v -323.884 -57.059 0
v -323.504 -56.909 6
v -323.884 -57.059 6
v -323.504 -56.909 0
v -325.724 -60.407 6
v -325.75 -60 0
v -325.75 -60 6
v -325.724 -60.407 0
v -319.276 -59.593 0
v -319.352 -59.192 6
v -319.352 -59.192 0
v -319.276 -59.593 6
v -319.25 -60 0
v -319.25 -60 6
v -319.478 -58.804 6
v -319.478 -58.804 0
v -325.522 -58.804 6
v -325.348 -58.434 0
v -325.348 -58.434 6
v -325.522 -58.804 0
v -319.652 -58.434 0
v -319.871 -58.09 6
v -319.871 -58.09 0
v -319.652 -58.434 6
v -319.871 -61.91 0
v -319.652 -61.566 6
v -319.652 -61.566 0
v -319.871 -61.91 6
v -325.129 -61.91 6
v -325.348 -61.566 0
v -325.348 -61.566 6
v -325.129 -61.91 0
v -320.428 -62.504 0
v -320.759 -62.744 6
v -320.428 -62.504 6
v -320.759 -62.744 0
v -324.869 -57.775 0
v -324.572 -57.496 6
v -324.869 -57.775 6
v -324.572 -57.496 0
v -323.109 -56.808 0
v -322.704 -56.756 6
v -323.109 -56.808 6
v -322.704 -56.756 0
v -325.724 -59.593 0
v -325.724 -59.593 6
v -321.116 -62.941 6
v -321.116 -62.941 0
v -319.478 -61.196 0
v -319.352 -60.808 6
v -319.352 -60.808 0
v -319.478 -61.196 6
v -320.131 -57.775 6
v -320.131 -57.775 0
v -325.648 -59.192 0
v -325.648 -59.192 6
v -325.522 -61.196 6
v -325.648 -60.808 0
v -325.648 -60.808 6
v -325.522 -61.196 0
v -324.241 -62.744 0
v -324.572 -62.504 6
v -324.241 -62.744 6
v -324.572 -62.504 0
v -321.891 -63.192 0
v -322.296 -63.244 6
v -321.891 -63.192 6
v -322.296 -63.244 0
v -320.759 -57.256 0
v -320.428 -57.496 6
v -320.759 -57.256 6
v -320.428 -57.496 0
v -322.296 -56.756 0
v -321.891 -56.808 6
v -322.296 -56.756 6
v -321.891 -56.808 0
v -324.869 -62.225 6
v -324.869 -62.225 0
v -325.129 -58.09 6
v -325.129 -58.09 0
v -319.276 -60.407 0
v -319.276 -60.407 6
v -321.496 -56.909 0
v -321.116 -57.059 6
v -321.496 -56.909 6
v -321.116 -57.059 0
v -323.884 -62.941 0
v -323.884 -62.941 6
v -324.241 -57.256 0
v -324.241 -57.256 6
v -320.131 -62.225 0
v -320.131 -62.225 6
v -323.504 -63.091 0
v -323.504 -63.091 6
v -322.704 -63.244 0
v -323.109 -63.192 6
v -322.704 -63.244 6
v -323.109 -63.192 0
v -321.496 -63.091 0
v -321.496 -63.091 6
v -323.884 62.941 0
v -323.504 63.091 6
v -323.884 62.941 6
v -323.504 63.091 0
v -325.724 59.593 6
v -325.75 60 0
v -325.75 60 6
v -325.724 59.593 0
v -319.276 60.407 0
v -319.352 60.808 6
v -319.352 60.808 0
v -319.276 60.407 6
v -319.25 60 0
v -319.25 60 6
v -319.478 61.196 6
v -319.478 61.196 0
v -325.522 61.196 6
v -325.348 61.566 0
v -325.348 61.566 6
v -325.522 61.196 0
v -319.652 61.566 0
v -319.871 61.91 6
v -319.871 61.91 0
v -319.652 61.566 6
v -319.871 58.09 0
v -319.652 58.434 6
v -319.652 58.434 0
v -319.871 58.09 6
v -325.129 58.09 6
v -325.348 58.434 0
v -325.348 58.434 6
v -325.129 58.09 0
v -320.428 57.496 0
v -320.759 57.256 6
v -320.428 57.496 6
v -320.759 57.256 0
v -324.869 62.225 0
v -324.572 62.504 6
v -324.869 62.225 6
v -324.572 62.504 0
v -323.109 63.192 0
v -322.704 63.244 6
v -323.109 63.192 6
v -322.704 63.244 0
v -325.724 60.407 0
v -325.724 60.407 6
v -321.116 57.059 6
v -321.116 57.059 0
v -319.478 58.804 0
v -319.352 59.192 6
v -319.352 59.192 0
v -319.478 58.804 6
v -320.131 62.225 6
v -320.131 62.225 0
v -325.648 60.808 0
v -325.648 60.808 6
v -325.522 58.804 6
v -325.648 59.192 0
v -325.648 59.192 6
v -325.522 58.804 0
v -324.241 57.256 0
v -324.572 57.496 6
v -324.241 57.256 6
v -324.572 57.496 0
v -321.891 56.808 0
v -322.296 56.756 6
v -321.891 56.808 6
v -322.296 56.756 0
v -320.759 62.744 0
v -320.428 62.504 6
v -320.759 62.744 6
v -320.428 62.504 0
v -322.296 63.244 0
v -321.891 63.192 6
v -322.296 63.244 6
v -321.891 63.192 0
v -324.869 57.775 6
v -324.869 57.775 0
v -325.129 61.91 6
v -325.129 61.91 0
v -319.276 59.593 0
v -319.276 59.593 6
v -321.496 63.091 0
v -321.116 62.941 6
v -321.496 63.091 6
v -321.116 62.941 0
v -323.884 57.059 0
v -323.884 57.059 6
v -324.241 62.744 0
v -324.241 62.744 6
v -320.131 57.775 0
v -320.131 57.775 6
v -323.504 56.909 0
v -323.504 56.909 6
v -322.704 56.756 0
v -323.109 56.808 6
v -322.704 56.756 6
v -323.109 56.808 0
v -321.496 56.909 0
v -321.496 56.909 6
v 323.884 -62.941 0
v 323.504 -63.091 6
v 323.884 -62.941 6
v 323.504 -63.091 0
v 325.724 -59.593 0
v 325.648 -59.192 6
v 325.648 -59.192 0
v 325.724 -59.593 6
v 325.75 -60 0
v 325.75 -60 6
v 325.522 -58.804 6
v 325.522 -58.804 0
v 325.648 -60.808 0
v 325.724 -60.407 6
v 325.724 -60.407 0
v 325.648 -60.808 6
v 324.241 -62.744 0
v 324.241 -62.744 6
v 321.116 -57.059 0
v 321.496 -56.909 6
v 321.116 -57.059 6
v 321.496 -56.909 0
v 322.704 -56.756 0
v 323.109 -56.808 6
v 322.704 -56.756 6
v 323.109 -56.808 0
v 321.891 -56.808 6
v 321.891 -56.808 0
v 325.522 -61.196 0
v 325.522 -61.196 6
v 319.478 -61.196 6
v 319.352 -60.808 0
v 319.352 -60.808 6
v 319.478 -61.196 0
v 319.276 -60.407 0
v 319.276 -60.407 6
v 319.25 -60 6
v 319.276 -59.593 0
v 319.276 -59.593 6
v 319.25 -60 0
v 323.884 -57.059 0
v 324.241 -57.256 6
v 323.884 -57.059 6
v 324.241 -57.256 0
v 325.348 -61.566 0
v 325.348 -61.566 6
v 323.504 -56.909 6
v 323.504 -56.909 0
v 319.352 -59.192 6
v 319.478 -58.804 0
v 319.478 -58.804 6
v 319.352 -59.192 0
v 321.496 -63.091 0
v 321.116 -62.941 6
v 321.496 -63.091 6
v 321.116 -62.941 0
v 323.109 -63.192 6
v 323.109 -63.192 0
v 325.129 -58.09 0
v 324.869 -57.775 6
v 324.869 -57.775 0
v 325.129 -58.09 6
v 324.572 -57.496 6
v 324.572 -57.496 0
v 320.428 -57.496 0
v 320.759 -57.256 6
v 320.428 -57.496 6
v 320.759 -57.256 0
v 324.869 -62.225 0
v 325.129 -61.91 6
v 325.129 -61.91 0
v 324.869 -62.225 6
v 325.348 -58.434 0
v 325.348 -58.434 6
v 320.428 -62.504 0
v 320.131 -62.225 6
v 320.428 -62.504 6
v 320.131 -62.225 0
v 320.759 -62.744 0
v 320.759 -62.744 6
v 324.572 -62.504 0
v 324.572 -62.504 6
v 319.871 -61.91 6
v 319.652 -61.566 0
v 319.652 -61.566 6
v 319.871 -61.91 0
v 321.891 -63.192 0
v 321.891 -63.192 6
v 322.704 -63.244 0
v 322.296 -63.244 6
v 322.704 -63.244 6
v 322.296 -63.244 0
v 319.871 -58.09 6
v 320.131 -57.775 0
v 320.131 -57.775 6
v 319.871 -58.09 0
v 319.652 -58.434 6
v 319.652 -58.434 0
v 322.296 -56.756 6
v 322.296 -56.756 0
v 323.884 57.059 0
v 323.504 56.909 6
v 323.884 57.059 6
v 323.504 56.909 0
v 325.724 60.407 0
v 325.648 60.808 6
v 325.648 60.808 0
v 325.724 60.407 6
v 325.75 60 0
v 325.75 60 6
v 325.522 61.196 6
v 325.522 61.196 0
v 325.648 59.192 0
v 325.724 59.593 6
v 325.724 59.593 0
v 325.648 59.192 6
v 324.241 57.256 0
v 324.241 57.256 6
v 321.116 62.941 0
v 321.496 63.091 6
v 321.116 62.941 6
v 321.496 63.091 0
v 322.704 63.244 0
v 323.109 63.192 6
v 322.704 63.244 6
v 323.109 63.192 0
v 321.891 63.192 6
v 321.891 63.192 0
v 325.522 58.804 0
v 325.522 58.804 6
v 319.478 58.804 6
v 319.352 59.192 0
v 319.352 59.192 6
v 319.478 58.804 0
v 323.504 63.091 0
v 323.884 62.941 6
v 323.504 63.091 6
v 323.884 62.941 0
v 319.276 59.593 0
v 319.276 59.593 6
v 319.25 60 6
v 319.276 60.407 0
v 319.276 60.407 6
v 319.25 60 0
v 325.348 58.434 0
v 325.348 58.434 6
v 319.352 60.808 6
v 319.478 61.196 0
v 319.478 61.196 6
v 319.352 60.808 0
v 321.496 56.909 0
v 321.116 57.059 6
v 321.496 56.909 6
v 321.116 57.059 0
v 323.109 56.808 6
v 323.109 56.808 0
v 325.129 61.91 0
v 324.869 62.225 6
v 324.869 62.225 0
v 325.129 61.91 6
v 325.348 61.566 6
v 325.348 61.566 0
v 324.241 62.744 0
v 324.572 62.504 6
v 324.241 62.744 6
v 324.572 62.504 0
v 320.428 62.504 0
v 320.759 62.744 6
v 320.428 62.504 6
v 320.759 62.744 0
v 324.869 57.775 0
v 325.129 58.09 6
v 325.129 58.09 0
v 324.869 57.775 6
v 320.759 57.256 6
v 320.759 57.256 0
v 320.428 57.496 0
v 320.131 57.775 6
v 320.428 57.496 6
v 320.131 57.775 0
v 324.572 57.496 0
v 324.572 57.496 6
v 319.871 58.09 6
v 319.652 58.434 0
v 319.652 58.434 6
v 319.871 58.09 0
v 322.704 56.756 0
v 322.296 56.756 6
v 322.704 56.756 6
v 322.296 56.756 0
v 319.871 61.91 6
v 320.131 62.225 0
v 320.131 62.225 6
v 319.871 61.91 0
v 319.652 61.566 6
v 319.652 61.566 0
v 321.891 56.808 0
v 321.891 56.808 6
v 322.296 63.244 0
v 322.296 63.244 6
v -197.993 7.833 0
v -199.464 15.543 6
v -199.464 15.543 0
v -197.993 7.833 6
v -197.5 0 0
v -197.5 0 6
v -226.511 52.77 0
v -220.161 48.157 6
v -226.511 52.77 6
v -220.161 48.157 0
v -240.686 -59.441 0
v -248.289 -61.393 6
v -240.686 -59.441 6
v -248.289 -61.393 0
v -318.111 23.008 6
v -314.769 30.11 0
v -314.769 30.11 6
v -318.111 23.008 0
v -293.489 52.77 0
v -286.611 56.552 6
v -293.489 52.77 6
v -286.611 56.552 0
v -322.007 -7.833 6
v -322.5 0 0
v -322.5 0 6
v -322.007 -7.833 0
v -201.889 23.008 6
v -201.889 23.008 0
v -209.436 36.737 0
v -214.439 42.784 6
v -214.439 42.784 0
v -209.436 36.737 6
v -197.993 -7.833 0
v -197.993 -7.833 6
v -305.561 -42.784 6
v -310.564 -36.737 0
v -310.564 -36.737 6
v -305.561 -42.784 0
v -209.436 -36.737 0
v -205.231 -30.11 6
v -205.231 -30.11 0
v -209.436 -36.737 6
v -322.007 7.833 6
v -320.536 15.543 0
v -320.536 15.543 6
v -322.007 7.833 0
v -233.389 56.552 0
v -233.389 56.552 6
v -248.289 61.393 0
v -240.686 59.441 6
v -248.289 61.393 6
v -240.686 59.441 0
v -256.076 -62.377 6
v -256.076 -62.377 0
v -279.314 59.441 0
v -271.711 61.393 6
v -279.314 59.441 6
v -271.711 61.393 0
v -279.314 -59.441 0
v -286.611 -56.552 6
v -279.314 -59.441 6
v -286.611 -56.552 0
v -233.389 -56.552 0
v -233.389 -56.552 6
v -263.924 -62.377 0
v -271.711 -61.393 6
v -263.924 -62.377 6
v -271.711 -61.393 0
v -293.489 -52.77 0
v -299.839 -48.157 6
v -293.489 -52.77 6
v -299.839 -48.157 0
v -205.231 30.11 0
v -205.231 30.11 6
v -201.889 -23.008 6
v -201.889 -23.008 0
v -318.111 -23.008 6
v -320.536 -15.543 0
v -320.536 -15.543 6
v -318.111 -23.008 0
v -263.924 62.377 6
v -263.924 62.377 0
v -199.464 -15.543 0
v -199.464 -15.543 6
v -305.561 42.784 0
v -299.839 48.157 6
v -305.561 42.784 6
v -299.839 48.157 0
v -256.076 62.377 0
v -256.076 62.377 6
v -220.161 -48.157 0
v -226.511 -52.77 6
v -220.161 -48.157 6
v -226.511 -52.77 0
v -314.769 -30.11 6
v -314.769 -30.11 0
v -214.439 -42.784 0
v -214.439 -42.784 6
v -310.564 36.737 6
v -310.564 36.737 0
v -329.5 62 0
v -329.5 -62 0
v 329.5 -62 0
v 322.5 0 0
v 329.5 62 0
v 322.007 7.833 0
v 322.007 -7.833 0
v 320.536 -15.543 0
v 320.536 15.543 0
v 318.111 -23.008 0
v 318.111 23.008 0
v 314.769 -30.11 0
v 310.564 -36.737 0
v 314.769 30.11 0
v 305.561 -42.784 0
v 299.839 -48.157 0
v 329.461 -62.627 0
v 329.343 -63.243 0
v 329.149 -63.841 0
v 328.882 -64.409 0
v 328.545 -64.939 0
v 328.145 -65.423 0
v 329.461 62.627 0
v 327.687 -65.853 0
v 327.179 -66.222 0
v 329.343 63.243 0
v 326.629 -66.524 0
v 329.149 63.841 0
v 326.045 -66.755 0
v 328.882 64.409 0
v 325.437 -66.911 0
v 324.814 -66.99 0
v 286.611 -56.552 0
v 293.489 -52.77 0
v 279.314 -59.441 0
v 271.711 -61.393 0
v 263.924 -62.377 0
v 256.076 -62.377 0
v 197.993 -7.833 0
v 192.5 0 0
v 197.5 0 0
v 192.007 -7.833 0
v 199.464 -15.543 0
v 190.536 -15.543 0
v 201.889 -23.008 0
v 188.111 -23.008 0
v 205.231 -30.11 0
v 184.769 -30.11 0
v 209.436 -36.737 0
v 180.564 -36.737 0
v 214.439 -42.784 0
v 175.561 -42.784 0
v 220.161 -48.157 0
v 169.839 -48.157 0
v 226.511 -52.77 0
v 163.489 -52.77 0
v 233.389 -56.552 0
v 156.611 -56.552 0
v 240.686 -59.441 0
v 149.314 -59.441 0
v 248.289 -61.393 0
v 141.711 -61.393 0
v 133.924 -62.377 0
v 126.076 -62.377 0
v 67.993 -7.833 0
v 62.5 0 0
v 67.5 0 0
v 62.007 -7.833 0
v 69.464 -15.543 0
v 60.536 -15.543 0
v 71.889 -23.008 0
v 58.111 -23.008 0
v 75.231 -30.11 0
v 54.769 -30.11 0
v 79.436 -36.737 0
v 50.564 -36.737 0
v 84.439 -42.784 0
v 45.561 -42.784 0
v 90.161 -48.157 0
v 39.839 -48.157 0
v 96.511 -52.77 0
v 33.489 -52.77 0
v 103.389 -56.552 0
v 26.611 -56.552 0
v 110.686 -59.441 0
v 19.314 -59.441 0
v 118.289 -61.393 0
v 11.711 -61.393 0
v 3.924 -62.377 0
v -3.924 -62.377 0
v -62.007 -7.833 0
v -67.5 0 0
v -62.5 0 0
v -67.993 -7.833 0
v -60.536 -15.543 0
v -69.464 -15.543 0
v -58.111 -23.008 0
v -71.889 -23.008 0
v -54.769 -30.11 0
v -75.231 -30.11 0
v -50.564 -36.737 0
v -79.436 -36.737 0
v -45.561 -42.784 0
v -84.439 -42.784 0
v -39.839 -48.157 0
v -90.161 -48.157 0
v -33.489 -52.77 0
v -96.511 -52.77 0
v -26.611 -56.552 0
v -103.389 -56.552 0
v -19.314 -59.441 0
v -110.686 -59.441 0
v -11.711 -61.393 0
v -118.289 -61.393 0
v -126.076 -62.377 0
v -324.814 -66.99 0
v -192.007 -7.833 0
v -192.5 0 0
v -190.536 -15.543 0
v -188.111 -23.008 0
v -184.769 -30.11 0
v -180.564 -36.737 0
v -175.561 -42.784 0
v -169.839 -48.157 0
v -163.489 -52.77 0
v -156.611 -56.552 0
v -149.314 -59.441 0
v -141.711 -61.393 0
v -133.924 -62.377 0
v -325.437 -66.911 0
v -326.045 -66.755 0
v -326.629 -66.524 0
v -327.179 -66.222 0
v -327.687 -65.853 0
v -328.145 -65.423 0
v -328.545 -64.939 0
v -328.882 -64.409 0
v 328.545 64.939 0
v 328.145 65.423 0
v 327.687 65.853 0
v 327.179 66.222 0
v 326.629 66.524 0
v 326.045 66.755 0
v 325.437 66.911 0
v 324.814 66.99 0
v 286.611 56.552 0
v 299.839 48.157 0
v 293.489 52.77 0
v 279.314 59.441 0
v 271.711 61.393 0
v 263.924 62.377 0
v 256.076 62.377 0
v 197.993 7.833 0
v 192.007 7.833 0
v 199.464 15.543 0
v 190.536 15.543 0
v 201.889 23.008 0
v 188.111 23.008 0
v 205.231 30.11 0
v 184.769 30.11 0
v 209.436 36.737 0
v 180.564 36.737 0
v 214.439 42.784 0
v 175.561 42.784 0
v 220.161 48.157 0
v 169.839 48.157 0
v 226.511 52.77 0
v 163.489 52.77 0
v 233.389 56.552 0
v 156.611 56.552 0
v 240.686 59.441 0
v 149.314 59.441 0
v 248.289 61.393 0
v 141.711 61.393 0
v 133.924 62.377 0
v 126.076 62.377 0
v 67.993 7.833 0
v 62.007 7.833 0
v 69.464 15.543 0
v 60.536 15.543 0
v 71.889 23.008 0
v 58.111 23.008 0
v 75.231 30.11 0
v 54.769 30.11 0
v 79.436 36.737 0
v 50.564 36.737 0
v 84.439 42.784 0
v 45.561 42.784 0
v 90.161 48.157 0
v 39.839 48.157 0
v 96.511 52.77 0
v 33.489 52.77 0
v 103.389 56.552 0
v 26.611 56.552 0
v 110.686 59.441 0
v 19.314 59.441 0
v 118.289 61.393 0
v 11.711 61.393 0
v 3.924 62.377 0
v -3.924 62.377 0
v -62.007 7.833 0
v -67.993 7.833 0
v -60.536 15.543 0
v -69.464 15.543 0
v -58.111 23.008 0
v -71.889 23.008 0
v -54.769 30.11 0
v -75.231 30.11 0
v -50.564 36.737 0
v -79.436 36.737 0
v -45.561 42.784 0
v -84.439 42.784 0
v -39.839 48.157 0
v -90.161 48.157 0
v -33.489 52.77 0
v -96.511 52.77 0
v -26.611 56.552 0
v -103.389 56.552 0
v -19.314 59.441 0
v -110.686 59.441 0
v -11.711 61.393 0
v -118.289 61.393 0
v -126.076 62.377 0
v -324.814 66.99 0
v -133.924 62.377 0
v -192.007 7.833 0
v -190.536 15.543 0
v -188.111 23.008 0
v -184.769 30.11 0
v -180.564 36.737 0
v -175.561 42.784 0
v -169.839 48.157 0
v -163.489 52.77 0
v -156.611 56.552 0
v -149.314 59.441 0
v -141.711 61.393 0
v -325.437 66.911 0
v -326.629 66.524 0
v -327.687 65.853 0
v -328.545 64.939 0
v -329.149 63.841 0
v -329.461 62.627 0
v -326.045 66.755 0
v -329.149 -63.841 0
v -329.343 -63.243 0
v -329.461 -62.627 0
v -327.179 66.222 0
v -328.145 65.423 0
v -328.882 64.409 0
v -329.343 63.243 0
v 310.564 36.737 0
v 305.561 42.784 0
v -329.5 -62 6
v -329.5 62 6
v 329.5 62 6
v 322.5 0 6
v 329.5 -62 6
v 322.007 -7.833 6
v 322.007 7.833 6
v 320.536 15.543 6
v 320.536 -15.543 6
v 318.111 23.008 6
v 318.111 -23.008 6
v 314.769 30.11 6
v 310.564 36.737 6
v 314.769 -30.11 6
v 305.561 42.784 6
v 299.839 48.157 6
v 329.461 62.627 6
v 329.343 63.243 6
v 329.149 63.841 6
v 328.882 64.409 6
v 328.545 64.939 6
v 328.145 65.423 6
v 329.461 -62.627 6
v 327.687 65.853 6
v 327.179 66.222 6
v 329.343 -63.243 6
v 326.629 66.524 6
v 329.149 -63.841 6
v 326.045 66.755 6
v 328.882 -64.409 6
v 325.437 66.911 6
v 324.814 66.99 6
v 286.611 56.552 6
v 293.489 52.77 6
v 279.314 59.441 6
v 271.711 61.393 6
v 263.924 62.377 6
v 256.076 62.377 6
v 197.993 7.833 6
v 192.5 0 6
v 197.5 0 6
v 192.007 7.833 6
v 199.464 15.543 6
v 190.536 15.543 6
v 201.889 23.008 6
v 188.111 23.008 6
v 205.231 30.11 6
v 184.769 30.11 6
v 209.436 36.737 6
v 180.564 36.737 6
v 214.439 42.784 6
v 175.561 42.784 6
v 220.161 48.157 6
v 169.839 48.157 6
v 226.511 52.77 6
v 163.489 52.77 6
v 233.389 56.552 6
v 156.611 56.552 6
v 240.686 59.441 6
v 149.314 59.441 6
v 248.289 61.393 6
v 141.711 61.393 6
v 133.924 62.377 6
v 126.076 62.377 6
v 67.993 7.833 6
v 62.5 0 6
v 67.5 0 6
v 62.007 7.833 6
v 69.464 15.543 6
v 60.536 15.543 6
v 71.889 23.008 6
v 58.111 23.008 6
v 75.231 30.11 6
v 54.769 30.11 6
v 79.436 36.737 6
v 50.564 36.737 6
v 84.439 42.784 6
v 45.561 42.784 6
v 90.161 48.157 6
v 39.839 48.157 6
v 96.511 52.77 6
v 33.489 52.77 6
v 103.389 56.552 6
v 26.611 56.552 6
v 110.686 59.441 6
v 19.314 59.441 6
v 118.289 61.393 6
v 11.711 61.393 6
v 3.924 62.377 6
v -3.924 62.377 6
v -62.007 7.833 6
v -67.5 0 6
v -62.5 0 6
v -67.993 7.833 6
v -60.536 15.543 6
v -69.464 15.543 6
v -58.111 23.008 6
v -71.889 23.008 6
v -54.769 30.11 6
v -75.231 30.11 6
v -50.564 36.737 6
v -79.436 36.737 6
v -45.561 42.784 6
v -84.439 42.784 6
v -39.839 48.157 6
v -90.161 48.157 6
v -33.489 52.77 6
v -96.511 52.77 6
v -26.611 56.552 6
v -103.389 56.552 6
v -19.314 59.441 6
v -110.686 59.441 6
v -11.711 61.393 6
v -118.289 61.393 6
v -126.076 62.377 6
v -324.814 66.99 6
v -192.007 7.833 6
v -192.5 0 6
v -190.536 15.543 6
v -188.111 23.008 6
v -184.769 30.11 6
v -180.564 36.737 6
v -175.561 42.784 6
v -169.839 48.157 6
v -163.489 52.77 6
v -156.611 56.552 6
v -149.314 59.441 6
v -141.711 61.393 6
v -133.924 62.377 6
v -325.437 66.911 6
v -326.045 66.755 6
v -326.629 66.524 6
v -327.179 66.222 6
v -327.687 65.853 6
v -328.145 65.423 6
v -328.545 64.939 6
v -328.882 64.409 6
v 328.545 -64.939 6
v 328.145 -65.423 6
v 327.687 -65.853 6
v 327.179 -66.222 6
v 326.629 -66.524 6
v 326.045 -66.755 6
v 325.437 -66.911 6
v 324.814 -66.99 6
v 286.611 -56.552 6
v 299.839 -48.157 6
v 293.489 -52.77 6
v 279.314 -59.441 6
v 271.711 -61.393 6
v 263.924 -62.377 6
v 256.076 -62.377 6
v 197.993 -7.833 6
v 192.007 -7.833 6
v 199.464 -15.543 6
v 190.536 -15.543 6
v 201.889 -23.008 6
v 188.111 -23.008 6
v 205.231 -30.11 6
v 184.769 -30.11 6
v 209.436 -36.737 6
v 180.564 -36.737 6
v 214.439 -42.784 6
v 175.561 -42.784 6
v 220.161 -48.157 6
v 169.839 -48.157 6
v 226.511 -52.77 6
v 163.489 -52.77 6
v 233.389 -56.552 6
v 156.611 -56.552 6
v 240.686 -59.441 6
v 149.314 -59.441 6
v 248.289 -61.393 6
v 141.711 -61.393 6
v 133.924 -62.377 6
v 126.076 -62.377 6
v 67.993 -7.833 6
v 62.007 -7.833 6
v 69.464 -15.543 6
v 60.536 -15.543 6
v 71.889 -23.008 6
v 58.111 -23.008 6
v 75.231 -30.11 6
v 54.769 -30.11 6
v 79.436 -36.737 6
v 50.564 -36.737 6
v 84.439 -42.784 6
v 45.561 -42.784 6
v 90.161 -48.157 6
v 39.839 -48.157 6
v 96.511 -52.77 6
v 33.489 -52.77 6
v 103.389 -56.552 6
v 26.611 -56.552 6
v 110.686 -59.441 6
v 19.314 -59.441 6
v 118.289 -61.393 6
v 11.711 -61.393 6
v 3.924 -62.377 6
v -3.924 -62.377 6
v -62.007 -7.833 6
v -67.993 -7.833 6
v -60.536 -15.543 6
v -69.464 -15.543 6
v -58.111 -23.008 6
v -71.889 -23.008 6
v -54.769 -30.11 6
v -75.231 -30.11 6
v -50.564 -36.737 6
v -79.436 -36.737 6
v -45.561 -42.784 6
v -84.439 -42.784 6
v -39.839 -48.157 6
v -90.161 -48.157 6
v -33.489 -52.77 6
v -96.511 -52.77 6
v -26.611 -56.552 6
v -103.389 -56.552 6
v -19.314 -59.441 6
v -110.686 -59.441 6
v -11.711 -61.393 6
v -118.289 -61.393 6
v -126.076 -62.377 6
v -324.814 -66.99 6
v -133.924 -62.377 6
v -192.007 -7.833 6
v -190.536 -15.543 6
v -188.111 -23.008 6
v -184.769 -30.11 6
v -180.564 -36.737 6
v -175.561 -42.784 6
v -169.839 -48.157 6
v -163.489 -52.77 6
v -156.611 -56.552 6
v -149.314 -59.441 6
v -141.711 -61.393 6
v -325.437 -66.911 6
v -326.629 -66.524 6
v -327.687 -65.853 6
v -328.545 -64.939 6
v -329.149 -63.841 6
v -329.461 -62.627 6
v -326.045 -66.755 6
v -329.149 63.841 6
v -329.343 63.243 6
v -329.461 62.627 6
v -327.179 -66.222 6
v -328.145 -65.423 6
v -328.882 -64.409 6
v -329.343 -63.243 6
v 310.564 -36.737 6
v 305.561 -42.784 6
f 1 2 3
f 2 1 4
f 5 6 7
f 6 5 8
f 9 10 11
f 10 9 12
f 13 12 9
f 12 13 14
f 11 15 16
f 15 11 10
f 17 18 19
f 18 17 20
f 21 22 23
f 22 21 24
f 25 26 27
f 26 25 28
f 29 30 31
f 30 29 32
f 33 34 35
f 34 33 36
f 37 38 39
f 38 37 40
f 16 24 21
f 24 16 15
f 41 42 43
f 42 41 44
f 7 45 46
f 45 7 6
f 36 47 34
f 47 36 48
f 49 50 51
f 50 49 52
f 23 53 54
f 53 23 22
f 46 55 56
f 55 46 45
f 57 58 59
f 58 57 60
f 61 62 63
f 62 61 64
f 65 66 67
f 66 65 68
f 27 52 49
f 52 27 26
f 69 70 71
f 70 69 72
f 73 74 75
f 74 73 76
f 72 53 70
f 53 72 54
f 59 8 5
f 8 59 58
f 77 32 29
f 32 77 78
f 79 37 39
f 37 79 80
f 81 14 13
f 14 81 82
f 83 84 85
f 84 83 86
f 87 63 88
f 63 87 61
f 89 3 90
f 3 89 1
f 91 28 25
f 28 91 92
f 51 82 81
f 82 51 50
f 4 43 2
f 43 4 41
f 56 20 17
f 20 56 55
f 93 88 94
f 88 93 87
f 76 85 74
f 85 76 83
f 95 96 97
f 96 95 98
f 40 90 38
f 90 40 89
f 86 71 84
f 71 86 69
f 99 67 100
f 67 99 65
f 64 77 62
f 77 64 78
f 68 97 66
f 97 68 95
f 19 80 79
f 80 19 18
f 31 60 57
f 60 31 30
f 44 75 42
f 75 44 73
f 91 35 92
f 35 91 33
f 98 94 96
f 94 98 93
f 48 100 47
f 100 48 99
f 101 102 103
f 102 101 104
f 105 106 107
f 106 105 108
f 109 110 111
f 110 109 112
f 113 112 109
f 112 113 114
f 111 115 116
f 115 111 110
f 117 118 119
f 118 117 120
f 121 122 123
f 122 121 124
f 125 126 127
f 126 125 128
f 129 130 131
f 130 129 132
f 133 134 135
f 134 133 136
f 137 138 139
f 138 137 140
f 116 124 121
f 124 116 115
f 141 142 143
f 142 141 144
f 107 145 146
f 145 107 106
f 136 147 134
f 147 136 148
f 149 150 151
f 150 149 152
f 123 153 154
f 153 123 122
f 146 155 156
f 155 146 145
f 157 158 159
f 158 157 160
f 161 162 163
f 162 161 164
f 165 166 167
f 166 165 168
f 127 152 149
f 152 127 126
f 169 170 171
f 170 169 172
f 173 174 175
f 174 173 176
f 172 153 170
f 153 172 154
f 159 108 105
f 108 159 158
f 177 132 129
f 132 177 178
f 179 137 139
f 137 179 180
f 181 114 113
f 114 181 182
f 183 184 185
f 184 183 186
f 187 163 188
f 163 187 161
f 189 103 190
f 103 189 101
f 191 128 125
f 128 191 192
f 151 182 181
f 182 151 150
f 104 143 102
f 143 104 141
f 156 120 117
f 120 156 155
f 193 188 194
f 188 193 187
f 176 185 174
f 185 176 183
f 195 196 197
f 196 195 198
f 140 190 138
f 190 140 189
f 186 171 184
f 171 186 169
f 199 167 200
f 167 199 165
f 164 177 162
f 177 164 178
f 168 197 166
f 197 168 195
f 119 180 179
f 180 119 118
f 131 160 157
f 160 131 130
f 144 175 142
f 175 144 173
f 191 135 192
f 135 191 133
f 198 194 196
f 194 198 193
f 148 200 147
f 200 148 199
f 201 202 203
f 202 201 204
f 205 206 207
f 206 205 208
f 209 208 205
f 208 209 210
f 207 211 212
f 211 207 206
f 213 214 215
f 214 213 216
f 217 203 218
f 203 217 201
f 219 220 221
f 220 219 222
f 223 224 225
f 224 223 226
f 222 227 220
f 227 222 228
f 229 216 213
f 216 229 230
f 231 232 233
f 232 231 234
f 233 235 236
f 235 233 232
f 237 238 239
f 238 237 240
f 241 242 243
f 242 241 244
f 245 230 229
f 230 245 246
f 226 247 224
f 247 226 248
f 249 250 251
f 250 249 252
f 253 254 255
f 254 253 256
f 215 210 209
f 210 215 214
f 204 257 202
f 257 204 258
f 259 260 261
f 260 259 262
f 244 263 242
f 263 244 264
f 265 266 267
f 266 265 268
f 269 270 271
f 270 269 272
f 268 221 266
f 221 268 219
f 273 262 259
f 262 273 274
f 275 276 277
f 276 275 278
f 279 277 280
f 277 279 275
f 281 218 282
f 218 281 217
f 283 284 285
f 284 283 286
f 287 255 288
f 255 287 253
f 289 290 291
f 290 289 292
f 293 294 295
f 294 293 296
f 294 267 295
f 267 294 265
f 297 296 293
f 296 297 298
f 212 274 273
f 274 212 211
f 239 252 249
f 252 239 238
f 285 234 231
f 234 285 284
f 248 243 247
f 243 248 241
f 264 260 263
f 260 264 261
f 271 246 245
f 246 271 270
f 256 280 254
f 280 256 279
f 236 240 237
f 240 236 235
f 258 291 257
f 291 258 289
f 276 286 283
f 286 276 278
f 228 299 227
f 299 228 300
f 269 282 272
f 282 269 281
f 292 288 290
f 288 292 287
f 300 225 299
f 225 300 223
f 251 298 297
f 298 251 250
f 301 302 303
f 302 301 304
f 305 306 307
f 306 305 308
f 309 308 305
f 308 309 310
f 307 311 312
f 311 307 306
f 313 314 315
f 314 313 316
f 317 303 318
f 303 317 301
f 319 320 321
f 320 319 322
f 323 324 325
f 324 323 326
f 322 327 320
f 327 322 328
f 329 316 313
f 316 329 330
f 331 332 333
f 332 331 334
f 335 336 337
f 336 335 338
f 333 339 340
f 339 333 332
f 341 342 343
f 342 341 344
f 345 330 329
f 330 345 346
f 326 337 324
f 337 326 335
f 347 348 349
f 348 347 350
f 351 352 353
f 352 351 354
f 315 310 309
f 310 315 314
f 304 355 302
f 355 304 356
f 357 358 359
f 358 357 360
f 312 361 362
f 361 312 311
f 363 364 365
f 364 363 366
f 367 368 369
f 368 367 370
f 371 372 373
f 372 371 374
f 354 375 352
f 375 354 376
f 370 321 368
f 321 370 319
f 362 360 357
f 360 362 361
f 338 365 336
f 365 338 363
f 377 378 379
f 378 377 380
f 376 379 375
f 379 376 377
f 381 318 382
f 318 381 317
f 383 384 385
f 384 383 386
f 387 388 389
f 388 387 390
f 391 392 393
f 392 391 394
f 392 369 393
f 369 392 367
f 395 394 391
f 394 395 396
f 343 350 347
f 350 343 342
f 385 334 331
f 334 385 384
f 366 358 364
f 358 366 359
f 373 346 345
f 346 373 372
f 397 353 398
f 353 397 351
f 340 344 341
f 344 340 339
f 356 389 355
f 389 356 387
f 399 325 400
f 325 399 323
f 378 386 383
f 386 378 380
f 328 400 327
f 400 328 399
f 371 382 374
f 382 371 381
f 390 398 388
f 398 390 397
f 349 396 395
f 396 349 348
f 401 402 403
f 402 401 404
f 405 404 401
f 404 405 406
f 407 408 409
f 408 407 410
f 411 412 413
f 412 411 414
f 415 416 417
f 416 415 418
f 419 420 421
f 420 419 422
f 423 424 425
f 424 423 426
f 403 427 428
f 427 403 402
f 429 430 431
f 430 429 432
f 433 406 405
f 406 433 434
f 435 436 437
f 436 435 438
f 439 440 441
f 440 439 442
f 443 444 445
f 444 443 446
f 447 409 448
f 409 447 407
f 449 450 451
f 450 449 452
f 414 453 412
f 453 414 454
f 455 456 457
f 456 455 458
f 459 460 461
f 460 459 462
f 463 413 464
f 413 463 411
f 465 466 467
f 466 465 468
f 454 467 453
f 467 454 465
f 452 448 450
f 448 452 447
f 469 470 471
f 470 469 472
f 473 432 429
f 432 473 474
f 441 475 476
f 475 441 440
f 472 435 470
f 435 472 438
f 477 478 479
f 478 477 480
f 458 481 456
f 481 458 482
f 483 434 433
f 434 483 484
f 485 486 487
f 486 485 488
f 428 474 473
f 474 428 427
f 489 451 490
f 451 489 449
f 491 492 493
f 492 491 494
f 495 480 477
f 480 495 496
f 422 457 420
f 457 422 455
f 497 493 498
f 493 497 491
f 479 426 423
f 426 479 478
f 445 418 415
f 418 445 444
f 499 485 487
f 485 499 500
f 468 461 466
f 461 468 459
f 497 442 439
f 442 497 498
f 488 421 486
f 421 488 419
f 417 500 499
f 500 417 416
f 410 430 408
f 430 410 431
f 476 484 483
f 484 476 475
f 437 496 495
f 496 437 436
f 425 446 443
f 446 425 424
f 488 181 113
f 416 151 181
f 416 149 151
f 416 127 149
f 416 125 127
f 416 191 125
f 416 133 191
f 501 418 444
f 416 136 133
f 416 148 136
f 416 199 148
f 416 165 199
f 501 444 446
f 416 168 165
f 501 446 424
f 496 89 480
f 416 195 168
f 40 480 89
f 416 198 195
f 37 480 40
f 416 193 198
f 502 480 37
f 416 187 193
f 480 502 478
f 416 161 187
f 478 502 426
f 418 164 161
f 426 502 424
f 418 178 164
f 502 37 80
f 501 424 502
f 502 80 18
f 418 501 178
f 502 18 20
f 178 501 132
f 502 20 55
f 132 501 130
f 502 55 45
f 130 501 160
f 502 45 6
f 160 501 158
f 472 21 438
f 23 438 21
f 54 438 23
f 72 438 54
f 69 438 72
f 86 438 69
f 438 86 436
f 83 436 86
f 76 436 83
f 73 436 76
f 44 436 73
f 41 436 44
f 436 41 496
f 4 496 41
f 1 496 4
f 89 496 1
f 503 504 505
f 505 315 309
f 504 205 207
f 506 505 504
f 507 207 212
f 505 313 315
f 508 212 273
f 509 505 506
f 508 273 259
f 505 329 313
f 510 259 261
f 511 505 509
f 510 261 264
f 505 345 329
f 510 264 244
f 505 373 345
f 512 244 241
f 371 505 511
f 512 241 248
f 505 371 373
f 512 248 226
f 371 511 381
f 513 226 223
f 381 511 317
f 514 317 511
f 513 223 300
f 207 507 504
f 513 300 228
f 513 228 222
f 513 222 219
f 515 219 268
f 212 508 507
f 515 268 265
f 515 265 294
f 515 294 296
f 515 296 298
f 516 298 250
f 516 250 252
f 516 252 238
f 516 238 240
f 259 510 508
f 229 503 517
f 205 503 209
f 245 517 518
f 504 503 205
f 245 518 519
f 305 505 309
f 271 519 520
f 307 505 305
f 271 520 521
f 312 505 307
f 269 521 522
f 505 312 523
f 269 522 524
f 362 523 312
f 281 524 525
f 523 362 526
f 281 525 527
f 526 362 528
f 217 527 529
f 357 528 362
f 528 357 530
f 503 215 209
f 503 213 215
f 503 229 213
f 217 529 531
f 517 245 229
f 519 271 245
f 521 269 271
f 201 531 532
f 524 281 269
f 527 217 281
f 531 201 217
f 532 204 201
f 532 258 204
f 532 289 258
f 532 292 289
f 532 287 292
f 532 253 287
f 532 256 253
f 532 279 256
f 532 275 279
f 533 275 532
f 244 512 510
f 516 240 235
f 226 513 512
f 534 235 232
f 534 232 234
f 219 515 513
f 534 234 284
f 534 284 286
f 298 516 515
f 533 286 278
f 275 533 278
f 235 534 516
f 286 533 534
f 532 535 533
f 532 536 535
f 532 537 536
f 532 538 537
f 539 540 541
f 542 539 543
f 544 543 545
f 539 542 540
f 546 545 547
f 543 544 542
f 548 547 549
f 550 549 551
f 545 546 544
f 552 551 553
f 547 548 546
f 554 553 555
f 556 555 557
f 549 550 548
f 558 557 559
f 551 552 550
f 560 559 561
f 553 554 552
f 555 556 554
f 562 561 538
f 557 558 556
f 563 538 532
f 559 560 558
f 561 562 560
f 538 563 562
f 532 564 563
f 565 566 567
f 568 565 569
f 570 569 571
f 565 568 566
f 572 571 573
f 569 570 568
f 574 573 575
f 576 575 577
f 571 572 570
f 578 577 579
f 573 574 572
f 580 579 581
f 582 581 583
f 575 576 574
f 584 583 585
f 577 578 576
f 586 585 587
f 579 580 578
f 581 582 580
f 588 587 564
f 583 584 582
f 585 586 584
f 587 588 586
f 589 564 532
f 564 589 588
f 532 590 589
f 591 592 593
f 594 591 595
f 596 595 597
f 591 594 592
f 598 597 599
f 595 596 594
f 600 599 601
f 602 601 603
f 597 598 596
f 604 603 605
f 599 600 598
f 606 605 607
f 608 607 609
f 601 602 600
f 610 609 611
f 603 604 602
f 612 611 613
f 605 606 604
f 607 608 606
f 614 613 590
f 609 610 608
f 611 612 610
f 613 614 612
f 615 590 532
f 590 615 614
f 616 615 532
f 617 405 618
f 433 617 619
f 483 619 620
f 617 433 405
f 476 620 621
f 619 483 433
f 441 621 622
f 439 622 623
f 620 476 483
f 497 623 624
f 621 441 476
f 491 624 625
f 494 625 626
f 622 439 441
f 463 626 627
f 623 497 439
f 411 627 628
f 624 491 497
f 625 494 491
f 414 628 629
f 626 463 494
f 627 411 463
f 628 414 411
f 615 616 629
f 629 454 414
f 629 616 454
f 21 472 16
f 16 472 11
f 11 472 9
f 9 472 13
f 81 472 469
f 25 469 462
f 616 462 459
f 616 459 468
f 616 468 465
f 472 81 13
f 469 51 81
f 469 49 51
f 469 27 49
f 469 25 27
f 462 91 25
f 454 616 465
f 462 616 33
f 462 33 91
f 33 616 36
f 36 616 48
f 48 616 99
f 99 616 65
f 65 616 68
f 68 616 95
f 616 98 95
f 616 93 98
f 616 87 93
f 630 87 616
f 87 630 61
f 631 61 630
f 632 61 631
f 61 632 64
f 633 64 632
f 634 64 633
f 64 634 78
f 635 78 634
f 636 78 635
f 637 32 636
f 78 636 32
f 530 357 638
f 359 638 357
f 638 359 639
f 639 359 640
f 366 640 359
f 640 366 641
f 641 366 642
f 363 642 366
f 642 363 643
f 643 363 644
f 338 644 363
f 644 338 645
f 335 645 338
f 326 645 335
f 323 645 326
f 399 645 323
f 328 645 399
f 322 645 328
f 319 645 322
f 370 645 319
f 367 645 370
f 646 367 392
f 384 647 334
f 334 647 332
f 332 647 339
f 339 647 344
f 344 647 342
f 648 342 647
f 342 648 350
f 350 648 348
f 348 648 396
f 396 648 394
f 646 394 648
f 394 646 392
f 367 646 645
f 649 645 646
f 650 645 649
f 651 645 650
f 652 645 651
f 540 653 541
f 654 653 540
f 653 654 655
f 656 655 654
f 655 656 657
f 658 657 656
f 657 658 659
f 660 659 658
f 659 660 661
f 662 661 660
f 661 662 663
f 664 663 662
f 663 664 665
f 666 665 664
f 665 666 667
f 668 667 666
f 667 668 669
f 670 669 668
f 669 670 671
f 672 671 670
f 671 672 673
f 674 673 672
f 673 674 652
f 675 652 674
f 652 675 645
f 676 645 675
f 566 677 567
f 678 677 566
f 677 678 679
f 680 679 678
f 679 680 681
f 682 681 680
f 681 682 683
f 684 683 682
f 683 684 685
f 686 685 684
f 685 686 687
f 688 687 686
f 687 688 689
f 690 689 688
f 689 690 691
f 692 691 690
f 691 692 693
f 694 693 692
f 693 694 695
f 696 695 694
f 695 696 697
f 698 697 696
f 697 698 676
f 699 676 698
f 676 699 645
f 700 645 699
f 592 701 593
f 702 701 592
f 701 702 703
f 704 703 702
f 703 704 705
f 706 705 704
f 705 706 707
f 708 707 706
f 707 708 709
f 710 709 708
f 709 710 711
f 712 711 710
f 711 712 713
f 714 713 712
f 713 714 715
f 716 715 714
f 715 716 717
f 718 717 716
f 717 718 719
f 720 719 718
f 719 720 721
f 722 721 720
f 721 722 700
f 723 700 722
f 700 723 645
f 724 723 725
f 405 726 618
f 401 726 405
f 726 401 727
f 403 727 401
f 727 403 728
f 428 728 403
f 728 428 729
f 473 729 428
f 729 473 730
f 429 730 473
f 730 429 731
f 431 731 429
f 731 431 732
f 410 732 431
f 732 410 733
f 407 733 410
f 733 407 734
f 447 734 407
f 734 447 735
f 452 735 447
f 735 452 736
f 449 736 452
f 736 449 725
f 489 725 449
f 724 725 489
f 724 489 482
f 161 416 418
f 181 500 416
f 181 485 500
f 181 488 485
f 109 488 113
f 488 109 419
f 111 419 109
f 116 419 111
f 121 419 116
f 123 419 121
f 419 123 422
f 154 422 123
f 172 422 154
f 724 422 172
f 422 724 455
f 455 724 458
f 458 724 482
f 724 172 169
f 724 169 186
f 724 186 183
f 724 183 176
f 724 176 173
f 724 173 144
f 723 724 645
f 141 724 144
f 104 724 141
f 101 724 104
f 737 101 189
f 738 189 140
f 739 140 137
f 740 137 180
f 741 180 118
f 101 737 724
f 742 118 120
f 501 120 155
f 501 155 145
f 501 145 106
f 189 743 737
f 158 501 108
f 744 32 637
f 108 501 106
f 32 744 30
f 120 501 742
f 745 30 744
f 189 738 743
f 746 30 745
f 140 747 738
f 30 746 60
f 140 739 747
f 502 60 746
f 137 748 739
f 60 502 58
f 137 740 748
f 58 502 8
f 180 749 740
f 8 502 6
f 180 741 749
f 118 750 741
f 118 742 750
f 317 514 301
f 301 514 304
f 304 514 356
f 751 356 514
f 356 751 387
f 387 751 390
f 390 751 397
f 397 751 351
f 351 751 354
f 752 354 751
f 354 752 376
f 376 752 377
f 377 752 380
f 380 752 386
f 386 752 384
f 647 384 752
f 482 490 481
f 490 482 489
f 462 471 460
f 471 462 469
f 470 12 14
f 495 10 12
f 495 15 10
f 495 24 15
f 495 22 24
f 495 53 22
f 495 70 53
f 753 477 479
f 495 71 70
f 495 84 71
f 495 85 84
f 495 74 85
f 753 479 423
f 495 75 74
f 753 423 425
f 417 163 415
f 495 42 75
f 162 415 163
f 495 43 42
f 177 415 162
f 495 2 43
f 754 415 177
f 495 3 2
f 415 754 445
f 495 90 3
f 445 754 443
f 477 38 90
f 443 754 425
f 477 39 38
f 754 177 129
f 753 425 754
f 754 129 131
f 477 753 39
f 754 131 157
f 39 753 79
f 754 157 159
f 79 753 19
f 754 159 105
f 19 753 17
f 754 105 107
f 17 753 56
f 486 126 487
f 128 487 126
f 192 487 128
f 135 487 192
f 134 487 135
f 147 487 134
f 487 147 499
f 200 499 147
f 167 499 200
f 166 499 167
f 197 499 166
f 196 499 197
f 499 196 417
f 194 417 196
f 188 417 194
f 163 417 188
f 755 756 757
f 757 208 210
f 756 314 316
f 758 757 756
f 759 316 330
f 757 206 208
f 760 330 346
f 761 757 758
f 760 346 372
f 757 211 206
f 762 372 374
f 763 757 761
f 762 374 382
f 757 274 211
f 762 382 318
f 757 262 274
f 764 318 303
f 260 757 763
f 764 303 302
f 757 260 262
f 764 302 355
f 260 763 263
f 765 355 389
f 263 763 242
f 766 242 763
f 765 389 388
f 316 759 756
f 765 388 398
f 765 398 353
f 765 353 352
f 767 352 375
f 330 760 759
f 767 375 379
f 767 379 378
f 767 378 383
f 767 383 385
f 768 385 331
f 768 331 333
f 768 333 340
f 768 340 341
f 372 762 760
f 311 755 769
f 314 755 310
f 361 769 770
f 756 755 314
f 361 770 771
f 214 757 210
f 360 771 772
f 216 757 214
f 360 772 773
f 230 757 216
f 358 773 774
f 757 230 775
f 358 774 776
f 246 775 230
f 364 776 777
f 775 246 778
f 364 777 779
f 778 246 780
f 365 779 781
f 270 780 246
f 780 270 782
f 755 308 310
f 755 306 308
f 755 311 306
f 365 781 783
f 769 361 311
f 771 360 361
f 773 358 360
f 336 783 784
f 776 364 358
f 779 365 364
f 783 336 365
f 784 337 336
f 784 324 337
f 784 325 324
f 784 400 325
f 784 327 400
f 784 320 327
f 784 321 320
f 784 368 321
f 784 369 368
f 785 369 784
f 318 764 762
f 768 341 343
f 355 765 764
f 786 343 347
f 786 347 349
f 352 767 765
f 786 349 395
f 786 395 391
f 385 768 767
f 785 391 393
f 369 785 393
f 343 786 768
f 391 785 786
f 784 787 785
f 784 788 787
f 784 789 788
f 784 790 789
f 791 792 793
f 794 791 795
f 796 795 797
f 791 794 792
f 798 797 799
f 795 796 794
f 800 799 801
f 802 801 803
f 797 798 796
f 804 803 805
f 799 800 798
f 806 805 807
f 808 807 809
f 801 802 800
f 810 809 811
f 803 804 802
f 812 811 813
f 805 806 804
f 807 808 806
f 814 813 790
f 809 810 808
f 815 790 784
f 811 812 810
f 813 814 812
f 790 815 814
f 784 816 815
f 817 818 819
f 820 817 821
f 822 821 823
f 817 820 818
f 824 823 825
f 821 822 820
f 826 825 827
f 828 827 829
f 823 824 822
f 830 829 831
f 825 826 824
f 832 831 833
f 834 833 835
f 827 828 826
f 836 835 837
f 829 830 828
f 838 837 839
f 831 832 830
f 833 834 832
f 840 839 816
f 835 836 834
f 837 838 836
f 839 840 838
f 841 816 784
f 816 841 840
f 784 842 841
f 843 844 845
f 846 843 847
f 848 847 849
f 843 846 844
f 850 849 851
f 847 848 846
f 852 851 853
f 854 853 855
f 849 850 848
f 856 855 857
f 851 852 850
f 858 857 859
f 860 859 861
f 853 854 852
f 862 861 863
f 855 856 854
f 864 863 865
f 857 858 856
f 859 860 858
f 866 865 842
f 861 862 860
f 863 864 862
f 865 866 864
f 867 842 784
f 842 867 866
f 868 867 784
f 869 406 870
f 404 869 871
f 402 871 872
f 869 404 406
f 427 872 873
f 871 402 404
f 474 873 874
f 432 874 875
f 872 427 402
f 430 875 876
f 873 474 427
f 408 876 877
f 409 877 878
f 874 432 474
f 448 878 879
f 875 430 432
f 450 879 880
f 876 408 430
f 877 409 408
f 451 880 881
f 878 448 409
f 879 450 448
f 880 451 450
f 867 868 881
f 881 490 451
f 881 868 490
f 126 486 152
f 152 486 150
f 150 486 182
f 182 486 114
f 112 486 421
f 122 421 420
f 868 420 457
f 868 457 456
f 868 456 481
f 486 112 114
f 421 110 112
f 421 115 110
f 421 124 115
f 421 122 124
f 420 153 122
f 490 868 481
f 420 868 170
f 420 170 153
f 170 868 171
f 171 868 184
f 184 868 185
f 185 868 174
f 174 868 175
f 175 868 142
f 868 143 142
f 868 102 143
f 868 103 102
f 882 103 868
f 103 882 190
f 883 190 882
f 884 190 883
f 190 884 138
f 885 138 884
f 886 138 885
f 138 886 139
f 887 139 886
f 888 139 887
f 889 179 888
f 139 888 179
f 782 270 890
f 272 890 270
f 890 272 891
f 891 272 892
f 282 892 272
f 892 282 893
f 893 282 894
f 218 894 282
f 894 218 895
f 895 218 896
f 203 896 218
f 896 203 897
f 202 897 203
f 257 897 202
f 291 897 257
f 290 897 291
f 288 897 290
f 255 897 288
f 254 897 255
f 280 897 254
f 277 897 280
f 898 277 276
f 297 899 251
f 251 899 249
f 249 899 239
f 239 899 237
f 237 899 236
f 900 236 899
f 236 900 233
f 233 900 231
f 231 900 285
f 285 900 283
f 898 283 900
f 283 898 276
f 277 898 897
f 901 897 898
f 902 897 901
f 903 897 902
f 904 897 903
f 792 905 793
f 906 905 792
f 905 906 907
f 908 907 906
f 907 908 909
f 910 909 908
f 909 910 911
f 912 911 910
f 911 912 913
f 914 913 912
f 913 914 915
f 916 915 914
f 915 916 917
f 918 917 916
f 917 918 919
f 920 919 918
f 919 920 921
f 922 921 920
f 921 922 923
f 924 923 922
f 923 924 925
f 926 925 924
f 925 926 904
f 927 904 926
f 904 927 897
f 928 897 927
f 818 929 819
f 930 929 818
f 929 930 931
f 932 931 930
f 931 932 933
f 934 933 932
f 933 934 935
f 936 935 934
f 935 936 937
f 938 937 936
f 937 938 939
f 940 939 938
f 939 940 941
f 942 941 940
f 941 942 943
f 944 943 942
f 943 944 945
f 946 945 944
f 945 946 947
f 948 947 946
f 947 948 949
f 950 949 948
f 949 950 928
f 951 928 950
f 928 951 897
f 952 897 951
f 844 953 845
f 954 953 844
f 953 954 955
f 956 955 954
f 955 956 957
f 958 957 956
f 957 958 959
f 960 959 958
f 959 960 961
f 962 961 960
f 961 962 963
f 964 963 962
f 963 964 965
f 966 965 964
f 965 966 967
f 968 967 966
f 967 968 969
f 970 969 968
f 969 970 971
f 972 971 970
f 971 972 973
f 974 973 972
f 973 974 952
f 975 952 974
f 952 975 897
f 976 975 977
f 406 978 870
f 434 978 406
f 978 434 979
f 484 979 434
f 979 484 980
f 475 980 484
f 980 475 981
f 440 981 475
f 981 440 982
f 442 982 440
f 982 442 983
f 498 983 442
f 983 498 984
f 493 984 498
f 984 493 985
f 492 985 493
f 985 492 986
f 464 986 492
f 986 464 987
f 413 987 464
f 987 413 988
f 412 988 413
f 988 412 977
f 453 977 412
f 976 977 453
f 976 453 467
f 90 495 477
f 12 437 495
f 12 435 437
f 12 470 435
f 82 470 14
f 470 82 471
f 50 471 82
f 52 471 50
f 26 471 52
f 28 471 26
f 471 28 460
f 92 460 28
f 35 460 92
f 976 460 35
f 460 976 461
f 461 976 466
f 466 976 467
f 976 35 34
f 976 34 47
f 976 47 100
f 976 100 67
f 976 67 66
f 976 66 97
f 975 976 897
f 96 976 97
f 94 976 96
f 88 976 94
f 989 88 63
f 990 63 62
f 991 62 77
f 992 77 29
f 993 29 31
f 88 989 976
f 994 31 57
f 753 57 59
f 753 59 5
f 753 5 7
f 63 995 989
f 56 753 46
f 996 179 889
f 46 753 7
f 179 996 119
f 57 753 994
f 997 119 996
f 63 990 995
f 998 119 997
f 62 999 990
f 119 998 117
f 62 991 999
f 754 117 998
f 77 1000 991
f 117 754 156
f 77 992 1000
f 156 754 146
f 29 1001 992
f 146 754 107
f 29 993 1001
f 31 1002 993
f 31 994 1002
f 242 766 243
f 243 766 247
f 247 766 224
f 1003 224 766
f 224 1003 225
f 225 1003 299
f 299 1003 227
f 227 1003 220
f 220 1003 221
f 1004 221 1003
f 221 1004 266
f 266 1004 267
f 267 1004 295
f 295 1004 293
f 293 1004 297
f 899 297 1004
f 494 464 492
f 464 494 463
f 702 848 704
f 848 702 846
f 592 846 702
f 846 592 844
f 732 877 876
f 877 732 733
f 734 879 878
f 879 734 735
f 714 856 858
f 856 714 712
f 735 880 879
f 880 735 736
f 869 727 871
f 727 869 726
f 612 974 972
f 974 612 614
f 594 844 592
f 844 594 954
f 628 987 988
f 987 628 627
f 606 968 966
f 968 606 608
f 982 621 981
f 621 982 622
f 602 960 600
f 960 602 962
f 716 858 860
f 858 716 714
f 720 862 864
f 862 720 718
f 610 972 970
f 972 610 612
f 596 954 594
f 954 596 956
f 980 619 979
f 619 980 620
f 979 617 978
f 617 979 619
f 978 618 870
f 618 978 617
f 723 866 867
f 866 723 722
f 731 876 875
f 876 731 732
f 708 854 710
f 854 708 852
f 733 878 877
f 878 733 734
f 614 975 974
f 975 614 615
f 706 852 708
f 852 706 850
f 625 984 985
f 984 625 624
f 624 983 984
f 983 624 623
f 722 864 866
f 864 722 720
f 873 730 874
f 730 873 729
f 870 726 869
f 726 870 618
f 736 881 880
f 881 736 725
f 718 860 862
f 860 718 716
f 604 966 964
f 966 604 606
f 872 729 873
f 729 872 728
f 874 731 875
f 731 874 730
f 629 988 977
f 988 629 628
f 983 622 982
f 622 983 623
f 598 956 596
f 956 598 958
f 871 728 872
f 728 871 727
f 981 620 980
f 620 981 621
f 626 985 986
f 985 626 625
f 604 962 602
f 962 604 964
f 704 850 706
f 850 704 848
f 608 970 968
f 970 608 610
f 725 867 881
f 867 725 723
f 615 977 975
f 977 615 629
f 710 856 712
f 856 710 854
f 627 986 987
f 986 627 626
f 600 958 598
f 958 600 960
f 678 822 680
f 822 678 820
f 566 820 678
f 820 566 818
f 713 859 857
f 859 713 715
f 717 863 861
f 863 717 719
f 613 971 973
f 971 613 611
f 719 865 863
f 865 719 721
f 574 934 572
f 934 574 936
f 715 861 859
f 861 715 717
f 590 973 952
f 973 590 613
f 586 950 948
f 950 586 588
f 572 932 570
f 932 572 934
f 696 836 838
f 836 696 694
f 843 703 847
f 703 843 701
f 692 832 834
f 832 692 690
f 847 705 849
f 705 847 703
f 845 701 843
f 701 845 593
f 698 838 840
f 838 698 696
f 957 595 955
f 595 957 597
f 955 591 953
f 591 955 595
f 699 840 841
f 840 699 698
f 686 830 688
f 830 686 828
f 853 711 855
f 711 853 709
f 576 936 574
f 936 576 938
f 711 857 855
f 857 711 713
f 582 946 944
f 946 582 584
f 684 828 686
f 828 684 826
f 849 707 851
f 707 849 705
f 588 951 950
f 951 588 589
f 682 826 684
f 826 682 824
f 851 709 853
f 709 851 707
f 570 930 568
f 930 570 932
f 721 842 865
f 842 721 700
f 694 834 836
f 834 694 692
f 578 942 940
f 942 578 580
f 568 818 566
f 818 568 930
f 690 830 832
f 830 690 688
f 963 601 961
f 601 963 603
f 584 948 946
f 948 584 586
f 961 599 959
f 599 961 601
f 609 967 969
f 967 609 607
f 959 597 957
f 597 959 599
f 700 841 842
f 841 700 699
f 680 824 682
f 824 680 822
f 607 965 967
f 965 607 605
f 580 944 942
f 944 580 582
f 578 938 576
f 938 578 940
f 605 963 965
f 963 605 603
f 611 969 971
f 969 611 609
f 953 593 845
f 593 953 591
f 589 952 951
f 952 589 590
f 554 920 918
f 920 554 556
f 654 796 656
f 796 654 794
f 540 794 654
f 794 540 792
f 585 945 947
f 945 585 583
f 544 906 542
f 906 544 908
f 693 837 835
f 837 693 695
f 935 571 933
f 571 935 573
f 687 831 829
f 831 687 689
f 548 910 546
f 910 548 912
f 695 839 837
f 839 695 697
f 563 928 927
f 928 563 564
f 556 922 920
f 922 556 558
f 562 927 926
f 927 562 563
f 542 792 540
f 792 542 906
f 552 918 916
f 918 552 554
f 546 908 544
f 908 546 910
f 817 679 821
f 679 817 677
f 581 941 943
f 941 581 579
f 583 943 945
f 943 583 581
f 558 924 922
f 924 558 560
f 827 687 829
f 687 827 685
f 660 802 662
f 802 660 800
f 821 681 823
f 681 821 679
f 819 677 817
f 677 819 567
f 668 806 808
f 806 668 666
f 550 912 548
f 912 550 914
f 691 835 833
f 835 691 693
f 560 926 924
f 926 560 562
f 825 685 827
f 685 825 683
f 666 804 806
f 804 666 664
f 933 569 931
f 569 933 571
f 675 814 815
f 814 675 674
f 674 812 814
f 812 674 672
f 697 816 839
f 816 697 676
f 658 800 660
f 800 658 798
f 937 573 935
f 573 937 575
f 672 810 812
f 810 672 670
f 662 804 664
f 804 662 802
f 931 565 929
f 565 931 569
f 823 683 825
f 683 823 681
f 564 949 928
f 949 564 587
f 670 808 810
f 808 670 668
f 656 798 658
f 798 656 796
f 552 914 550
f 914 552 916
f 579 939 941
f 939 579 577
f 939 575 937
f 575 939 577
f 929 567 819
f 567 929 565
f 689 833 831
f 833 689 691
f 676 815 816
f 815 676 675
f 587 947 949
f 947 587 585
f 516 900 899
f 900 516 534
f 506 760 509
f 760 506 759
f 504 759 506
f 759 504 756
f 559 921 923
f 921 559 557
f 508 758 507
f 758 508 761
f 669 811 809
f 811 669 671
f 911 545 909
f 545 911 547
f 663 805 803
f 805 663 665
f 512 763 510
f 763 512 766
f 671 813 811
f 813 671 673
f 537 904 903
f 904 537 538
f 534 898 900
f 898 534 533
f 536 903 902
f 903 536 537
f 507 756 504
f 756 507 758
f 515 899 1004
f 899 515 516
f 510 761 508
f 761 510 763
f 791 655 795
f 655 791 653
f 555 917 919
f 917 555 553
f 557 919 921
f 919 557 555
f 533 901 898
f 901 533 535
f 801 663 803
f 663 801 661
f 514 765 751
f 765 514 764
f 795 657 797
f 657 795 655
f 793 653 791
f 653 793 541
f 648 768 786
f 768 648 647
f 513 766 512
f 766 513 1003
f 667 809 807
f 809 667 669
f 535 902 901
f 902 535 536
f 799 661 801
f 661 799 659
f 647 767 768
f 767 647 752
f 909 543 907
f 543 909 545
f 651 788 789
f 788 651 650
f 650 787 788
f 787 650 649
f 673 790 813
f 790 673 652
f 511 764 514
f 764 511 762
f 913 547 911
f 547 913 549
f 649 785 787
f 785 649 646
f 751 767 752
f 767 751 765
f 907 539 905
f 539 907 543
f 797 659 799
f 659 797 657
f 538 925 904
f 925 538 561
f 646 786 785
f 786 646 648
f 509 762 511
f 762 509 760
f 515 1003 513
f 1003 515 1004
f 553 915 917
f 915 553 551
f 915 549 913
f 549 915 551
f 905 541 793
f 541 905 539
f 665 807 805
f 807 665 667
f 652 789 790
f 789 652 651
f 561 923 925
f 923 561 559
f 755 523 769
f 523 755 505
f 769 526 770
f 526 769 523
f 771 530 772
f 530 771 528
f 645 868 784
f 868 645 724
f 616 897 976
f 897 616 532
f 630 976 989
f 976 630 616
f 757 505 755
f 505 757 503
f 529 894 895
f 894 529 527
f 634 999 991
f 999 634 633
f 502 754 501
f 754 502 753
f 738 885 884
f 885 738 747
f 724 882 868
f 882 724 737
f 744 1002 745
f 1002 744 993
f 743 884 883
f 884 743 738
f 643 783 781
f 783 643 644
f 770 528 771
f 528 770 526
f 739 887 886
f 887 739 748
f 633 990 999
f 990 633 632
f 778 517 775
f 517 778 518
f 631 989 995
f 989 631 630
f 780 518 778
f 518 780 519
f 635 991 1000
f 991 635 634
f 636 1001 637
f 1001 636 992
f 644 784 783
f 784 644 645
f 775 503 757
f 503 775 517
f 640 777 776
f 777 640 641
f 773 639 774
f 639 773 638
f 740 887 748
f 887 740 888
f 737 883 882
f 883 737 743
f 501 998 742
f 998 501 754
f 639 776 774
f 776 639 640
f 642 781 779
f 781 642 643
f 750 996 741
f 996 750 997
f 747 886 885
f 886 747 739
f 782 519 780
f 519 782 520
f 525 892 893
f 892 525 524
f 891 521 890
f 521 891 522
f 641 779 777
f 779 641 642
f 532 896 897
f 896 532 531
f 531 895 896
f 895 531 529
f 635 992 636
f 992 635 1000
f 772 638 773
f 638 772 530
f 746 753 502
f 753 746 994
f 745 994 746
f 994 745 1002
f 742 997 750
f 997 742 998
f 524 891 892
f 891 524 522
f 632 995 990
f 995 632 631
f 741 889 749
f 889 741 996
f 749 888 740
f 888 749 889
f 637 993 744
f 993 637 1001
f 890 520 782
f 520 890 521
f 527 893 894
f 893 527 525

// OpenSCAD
$fn = 50;


difference() {
	union() {
		hull() {
			translate(v = [-324.5000000000, 62.0000000000, 0]) {
				cylinder(h = 6, r = 5);
			}
			translate(v = [324.5000000000, 62.0000000000, 0]) {
				cylinder(h = 6, r = 5);
			}
			translate(v = [-324.5000000000, -62.0000000000, 0]) {
				cylinder(h = 6, r = 5);
			}
			translate(v = [324.5000000000, -62.0000000000, 0]) {
				cylinder(h = 6, r = 5);
			}
		}
	}
	union() {
		#translate(v = [-322.5000000000, -60.0000000000, -100.0000000000]) {
			cylinder(h = 200, r = 3.2500000000);
		}
		#translate(v = [-322.5000000000, 60.0000000000, -100.0000000000]) {
			cylinder(h = 200, r = 3.2500000000);
		}
		#translate(v = [322.5000000000, -60.0000000000, -100.0000000000]) {
			cylinder(h = 200, r = 3.2500000000);
		}
		#translate(v = [322.5000000000, 60.0000000000, -100.0000000000]) {
			cylinder(h = 200, r = 3.2500000000);
		}
		#translate(v = [-260.0000000000, 0, 0]) {
			cylinder(h = 6, r = 62.5000000000);
		}
		#translate(v = [-130.0000000000, 0, 0]) {
			cylinder(h = 6, r = 62.5000000000);
		}
		#cylinder(h = 6, r = 62.5000000000);
		#translate(v = [130.0000000000, 0, 0]) {
			cylinder(h = 6, r = 62.5000000000);
		}
		#translate(v = [260.0000000000, 0, 0]) {
			cylinder(h = 6, r = 62.5000000000);
		}
	}
}
